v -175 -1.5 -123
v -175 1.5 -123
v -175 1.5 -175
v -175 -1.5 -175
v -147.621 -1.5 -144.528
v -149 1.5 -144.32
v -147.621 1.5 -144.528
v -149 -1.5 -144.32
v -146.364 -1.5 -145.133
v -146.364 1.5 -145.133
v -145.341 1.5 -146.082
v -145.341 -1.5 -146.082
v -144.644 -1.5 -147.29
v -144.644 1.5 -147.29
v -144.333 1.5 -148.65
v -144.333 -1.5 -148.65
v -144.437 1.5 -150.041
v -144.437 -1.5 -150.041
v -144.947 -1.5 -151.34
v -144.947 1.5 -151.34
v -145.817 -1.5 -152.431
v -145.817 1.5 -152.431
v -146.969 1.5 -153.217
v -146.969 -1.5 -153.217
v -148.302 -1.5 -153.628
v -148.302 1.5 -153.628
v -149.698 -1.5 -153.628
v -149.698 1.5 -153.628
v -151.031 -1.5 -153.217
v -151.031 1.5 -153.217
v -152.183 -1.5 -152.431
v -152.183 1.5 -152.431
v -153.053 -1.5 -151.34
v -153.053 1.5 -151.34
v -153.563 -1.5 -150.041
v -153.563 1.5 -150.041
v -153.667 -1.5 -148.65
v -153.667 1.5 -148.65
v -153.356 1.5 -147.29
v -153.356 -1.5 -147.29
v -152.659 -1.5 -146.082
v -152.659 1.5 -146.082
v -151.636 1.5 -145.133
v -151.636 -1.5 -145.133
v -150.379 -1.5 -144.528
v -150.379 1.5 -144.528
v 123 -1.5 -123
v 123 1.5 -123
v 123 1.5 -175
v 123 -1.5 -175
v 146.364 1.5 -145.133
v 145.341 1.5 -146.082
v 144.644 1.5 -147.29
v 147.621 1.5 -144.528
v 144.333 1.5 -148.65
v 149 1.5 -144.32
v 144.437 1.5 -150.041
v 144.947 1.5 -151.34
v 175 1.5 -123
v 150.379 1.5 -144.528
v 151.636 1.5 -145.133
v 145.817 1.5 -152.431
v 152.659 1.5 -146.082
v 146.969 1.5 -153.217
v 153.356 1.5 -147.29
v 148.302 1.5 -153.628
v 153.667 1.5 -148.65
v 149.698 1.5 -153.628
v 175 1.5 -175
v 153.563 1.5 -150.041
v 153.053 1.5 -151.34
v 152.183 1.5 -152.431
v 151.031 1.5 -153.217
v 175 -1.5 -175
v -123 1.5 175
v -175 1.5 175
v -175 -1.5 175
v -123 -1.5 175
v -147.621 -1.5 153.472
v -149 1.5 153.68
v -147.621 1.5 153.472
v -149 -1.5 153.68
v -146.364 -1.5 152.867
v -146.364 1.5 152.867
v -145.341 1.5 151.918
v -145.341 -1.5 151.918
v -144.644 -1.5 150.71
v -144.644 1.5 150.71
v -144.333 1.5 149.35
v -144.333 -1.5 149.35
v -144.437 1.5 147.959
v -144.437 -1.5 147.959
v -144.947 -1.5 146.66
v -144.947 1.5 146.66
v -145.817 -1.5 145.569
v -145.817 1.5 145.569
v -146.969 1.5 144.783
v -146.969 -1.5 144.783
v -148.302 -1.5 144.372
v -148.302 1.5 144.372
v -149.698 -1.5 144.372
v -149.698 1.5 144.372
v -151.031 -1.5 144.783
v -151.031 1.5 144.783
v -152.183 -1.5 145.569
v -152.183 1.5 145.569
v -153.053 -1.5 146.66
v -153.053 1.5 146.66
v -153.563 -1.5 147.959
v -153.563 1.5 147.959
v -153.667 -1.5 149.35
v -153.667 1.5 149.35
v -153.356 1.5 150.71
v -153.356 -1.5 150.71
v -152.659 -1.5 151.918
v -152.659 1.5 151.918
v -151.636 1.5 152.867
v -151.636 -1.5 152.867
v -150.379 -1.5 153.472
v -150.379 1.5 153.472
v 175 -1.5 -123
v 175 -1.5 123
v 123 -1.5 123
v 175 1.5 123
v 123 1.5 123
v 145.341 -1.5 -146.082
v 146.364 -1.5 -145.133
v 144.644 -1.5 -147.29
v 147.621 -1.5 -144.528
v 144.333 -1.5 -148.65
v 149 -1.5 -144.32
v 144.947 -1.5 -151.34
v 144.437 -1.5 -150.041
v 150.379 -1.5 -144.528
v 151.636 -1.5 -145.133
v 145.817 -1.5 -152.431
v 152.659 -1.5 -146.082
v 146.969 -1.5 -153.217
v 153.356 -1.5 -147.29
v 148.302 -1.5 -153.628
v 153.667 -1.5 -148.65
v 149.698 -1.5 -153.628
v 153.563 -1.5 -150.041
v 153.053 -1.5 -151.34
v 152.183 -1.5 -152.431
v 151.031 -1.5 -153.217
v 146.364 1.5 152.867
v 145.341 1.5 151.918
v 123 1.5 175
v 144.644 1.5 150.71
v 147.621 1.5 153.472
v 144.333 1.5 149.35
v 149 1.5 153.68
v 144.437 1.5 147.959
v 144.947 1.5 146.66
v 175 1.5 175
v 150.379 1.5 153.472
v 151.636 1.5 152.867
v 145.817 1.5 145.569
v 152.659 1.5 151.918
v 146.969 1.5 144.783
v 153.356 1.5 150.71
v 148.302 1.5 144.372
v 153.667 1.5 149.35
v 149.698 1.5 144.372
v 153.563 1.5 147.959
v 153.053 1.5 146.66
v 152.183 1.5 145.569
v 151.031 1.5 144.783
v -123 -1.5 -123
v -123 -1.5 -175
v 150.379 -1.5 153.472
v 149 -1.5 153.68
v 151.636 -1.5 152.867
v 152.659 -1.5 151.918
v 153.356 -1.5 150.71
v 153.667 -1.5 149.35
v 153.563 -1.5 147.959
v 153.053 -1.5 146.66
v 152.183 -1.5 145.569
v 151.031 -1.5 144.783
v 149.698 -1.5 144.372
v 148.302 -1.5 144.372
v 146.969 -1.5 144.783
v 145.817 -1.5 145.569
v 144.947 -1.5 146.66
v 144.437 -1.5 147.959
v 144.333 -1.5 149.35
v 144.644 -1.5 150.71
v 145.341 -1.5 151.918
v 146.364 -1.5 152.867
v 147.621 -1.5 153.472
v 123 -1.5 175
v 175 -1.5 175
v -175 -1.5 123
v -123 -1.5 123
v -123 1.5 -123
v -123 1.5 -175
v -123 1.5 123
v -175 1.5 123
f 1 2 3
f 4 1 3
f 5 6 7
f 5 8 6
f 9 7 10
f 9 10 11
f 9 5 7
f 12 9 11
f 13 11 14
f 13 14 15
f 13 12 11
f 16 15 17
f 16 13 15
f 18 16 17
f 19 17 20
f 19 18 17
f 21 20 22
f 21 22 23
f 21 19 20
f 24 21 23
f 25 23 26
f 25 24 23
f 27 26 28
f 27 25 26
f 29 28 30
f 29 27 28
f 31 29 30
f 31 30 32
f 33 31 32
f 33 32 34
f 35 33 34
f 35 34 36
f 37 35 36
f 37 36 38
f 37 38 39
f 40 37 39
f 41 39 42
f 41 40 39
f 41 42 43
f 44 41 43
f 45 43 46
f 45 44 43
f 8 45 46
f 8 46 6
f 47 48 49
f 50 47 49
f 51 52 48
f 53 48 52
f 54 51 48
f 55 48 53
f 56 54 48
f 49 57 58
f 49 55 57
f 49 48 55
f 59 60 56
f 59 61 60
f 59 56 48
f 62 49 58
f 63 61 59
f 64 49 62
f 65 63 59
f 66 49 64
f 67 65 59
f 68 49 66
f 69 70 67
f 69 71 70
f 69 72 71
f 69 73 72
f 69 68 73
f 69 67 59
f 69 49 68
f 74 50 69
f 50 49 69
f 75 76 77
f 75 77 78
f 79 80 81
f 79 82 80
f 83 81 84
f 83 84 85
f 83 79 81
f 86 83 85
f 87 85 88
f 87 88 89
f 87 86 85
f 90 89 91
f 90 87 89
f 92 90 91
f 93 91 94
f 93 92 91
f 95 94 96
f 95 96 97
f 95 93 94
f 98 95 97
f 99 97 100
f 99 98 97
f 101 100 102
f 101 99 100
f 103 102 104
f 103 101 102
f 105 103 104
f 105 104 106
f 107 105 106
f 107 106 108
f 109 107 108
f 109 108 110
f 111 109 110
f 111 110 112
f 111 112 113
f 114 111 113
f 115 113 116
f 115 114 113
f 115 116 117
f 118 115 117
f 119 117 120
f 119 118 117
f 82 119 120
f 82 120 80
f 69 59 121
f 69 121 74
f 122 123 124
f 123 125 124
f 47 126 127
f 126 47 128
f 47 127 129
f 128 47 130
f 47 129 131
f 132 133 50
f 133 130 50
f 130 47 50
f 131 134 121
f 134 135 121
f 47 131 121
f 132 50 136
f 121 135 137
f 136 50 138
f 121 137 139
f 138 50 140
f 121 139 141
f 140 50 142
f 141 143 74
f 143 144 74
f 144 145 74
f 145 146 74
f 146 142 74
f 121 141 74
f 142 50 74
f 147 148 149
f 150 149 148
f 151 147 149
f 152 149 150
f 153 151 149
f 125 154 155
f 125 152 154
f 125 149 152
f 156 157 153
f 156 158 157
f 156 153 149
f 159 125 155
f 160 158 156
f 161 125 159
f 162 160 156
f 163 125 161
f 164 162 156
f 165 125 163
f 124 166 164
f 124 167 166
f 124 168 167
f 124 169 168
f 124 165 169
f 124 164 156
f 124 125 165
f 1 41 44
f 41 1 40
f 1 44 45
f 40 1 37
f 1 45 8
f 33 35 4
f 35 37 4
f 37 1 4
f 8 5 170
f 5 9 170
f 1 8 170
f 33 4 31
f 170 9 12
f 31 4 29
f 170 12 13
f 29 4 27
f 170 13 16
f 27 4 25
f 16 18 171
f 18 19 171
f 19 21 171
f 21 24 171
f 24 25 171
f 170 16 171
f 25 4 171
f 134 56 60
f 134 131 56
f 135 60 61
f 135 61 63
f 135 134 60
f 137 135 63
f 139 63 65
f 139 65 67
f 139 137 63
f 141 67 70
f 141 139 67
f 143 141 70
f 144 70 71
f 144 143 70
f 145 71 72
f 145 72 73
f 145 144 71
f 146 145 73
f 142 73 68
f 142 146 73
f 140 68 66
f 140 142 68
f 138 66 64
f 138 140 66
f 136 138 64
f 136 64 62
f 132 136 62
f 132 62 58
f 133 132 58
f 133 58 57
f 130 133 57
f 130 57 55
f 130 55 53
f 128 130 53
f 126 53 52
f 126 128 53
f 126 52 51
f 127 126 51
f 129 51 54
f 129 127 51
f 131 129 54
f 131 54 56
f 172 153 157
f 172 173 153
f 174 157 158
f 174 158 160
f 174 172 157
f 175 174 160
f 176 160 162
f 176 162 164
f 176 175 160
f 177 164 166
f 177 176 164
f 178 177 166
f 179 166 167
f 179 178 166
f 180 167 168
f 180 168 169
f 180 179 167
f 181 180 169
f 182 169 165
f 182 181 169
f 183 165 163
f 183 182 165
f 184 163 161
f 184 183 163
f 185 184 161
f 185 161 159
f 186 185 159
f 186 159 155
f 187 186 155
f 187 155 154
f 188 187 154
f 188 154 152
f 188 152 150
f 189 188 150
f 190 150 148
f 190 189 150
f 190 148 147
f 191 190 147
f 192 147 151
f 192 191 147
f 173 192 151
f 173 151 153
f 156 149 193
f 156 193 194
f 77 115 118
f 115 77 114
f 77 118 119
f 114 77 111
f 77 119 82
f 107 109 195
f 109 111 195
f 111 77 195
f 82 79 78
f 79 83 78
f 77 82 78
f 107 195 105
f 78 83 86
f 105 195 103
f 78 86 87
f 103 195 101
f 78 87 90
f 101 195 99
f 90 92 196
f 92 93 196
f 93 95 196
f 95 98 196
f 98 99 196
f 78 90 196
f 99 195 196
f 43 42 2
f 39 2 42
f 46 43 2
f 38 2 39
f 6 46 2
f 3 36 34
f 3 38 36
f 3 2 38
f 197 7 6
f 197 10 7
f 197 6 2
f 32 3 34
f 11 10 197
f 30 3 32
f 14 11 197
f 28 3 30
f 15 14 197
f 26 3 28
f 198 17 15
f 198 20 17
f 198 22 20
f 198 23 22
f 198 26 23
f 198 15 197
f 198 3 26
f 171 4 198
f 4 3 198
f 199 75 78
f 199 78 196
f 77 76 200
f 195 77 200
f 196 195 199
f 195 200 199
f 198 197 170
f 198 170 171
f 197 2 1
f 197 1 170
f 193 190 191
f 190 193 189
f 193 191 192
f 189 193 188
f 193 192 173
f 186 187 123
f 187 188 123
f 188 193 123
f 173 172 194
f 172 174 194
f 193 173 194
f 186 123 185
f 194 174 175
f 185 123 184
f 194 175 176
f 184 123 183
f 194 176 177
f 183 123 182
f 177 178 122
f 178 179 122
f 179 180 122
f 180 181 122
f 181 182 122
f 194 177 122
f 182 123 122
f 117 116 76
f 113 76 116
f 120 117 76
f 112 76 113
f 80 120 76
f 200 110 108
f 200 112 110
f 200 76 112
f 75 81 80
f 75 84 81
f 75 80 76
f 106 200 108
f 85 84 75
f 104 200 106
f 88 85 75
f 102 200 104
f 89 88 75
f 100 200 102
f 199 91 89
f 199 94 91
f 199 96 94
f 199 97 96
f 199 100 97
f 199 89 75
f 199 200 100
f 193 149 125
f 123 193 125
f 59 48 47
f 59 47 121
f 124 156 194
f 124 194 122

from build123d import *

# Parameters (mm, degrees)
SKETCH1_W                      = 52
SKETCH1_H                      = 52
SKETCH1_R                      = 4.68
BASE_PLATE_CORNER_TABS_DEPTH   = 1.5
BASE_PLATE_CORNER_TABS_2_DEPTH = 1.5
BASE_PLATE_CORNER_TABS_3_DEPTH = 1.5
BASE_PLATE_CORNER_TABS_4_DEPTH = 1.5


with BuildPart() as part:
    # Sketch1 → Base plate corner tabs (new, symmetric)
    with BuildSketch(Plane(origin=(0, 0, 0), x_dir=(1, 0, 0), z_dir=(0, 1, 0))):
        with Locations((149, 149)):
            Rectangle(SKETCH1_W, SKETCH1_H)
        with Locations(Location((149, 149, 0), (0, 0, 270))):
            Circle(SKETCH1_R, mode=Mode.SUBTRACT)
    extrude(amount=BASE_PLATE_CORNER_TABS_DEPTH, both=True)


with BuildPart() as body_2:
    # Sketch1 → Base plate corner tabs 2 (new, symmetric)
    with BuildSketch(Plane(origin=(0, 0, 0), x_dir=(1, 0, 0), z_dir=(0, 1, 0))):
        with Locations((-149, 149)):
            Rectangle(SKETCH1_W, SKETCH1_H)
        with Locations(Location((-149, 149, 0), (0, 0, 270))):
            Circle(SKETCH1_R, mode=Mode.SUBTRACT)
    extrude(amount=BASE_PLATE_CORNER_TABS_2_DEPTH, both=True)


with BuildPart() as body_3:
    # Sketch1 → Base plate corner tabs 3 (new, symmetric)
    with BuildSketch(Plane(origin=(0, 0, 0), x_dir=(1, 0, 0), z_dir=(0, 1, 0))):
        with Locations((149, -149)):
            Rectangle(SKETCH1_W, SKETCH1_H)
        with Locations(Location((149, -149, 0), (0, 0, 270))):
            Circle(SKETCH1_R, mode=Mode.SUBTRACT)
    extrude(amount=BASE_PLATE_CORNER_TABS_3_DEPTH, both=True)


with BuildPart() as body_4:
    # Sketch1 → Base plate corner tabs 4 (new, symmetric)
    with BuildSketch(Plane(origin=(0, 0, 0), x_dir=(1, 0, 0), z_dir=(0, 1, 0))):
        with Locations((-149, -149)):
            Rectangle(SKETCH1_W, SKETCH1_H)
        with Locations(Location((-149, -149, 0), (0, 0, 270))):
            Circle(SKETCH1_R, mode=Mode.SUBTRACT)
    extrude(amount=BASE_PLATE_CORNER_TABS_4_DEPTH, both=True)


solid = Compound([part.part, body_2.part, body_3.part, body_4.part])
